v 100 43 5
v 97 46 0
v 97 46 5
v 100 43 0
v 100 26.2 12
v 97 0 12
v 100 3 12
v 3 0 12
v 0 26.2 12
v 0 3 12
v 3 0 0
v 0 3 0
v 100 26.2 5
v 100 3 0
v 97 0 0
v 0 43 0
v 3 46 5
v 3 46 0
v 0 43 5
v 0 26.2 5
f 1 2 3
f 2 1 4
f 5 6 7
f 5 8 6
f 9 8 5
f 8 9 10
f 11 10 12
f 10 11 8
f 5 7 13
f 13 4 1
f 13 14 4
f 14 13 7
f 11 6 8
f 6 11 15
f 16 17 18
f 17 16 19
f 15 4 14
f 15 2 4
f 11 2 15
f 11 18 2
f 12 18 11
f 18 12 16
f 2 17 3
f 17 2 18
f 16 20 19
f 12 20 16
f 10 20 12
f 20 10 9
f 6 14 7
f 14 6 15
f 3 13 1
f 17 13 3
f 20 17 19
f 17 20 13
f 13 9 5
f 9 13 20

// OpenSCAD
$fn = 32;

// ----------------------------------------------------------------------
// Stepped bar: sidestep, 100 x 46 x 12/5 mm
// ----------------------------------------------------------------------

// --- parameters (mm) ---
bar_l = 100;              // bar length, X
bar_w = 46;               // bar width, Y
plate_t = 12;             // thickness of the thick zone, Z
thin_t = 5;               // thickness of the thin zone
corner_c = 3;             // corner chamfer of the bar
step_cut = 7;             // material removed from the thin zone
ledge_y = 26.2;           // start of the ledge from the front edge
depth_1 = 7;              // depth of cut 1 from the top face
fit_tol = 0.1;            // declared fit tolerance (prompt contract)
free_tol = 0.5;           // declared free tolerance (prompt contract)

profile = [[3, 0], [97, 0], [100, 3], [100, 43], [97, 46], [3, 46], [0, 43], [0, 3]];  // primary outline, 8 points, counter clockwise
void_1 = [[-1, 26.2], [101, 26.2], [101, 47], [-1, 47]];  // ledge cut along one edge, 4 points

// --- the one profile operation ---
difference() {
  linear_extrude(height = plate_t) polygon(points = profile);
  translate([0, 0, plate_t - depth_1])
    linear_extrude(height = depth_1 + 1) polygon(points = void_1);
}
